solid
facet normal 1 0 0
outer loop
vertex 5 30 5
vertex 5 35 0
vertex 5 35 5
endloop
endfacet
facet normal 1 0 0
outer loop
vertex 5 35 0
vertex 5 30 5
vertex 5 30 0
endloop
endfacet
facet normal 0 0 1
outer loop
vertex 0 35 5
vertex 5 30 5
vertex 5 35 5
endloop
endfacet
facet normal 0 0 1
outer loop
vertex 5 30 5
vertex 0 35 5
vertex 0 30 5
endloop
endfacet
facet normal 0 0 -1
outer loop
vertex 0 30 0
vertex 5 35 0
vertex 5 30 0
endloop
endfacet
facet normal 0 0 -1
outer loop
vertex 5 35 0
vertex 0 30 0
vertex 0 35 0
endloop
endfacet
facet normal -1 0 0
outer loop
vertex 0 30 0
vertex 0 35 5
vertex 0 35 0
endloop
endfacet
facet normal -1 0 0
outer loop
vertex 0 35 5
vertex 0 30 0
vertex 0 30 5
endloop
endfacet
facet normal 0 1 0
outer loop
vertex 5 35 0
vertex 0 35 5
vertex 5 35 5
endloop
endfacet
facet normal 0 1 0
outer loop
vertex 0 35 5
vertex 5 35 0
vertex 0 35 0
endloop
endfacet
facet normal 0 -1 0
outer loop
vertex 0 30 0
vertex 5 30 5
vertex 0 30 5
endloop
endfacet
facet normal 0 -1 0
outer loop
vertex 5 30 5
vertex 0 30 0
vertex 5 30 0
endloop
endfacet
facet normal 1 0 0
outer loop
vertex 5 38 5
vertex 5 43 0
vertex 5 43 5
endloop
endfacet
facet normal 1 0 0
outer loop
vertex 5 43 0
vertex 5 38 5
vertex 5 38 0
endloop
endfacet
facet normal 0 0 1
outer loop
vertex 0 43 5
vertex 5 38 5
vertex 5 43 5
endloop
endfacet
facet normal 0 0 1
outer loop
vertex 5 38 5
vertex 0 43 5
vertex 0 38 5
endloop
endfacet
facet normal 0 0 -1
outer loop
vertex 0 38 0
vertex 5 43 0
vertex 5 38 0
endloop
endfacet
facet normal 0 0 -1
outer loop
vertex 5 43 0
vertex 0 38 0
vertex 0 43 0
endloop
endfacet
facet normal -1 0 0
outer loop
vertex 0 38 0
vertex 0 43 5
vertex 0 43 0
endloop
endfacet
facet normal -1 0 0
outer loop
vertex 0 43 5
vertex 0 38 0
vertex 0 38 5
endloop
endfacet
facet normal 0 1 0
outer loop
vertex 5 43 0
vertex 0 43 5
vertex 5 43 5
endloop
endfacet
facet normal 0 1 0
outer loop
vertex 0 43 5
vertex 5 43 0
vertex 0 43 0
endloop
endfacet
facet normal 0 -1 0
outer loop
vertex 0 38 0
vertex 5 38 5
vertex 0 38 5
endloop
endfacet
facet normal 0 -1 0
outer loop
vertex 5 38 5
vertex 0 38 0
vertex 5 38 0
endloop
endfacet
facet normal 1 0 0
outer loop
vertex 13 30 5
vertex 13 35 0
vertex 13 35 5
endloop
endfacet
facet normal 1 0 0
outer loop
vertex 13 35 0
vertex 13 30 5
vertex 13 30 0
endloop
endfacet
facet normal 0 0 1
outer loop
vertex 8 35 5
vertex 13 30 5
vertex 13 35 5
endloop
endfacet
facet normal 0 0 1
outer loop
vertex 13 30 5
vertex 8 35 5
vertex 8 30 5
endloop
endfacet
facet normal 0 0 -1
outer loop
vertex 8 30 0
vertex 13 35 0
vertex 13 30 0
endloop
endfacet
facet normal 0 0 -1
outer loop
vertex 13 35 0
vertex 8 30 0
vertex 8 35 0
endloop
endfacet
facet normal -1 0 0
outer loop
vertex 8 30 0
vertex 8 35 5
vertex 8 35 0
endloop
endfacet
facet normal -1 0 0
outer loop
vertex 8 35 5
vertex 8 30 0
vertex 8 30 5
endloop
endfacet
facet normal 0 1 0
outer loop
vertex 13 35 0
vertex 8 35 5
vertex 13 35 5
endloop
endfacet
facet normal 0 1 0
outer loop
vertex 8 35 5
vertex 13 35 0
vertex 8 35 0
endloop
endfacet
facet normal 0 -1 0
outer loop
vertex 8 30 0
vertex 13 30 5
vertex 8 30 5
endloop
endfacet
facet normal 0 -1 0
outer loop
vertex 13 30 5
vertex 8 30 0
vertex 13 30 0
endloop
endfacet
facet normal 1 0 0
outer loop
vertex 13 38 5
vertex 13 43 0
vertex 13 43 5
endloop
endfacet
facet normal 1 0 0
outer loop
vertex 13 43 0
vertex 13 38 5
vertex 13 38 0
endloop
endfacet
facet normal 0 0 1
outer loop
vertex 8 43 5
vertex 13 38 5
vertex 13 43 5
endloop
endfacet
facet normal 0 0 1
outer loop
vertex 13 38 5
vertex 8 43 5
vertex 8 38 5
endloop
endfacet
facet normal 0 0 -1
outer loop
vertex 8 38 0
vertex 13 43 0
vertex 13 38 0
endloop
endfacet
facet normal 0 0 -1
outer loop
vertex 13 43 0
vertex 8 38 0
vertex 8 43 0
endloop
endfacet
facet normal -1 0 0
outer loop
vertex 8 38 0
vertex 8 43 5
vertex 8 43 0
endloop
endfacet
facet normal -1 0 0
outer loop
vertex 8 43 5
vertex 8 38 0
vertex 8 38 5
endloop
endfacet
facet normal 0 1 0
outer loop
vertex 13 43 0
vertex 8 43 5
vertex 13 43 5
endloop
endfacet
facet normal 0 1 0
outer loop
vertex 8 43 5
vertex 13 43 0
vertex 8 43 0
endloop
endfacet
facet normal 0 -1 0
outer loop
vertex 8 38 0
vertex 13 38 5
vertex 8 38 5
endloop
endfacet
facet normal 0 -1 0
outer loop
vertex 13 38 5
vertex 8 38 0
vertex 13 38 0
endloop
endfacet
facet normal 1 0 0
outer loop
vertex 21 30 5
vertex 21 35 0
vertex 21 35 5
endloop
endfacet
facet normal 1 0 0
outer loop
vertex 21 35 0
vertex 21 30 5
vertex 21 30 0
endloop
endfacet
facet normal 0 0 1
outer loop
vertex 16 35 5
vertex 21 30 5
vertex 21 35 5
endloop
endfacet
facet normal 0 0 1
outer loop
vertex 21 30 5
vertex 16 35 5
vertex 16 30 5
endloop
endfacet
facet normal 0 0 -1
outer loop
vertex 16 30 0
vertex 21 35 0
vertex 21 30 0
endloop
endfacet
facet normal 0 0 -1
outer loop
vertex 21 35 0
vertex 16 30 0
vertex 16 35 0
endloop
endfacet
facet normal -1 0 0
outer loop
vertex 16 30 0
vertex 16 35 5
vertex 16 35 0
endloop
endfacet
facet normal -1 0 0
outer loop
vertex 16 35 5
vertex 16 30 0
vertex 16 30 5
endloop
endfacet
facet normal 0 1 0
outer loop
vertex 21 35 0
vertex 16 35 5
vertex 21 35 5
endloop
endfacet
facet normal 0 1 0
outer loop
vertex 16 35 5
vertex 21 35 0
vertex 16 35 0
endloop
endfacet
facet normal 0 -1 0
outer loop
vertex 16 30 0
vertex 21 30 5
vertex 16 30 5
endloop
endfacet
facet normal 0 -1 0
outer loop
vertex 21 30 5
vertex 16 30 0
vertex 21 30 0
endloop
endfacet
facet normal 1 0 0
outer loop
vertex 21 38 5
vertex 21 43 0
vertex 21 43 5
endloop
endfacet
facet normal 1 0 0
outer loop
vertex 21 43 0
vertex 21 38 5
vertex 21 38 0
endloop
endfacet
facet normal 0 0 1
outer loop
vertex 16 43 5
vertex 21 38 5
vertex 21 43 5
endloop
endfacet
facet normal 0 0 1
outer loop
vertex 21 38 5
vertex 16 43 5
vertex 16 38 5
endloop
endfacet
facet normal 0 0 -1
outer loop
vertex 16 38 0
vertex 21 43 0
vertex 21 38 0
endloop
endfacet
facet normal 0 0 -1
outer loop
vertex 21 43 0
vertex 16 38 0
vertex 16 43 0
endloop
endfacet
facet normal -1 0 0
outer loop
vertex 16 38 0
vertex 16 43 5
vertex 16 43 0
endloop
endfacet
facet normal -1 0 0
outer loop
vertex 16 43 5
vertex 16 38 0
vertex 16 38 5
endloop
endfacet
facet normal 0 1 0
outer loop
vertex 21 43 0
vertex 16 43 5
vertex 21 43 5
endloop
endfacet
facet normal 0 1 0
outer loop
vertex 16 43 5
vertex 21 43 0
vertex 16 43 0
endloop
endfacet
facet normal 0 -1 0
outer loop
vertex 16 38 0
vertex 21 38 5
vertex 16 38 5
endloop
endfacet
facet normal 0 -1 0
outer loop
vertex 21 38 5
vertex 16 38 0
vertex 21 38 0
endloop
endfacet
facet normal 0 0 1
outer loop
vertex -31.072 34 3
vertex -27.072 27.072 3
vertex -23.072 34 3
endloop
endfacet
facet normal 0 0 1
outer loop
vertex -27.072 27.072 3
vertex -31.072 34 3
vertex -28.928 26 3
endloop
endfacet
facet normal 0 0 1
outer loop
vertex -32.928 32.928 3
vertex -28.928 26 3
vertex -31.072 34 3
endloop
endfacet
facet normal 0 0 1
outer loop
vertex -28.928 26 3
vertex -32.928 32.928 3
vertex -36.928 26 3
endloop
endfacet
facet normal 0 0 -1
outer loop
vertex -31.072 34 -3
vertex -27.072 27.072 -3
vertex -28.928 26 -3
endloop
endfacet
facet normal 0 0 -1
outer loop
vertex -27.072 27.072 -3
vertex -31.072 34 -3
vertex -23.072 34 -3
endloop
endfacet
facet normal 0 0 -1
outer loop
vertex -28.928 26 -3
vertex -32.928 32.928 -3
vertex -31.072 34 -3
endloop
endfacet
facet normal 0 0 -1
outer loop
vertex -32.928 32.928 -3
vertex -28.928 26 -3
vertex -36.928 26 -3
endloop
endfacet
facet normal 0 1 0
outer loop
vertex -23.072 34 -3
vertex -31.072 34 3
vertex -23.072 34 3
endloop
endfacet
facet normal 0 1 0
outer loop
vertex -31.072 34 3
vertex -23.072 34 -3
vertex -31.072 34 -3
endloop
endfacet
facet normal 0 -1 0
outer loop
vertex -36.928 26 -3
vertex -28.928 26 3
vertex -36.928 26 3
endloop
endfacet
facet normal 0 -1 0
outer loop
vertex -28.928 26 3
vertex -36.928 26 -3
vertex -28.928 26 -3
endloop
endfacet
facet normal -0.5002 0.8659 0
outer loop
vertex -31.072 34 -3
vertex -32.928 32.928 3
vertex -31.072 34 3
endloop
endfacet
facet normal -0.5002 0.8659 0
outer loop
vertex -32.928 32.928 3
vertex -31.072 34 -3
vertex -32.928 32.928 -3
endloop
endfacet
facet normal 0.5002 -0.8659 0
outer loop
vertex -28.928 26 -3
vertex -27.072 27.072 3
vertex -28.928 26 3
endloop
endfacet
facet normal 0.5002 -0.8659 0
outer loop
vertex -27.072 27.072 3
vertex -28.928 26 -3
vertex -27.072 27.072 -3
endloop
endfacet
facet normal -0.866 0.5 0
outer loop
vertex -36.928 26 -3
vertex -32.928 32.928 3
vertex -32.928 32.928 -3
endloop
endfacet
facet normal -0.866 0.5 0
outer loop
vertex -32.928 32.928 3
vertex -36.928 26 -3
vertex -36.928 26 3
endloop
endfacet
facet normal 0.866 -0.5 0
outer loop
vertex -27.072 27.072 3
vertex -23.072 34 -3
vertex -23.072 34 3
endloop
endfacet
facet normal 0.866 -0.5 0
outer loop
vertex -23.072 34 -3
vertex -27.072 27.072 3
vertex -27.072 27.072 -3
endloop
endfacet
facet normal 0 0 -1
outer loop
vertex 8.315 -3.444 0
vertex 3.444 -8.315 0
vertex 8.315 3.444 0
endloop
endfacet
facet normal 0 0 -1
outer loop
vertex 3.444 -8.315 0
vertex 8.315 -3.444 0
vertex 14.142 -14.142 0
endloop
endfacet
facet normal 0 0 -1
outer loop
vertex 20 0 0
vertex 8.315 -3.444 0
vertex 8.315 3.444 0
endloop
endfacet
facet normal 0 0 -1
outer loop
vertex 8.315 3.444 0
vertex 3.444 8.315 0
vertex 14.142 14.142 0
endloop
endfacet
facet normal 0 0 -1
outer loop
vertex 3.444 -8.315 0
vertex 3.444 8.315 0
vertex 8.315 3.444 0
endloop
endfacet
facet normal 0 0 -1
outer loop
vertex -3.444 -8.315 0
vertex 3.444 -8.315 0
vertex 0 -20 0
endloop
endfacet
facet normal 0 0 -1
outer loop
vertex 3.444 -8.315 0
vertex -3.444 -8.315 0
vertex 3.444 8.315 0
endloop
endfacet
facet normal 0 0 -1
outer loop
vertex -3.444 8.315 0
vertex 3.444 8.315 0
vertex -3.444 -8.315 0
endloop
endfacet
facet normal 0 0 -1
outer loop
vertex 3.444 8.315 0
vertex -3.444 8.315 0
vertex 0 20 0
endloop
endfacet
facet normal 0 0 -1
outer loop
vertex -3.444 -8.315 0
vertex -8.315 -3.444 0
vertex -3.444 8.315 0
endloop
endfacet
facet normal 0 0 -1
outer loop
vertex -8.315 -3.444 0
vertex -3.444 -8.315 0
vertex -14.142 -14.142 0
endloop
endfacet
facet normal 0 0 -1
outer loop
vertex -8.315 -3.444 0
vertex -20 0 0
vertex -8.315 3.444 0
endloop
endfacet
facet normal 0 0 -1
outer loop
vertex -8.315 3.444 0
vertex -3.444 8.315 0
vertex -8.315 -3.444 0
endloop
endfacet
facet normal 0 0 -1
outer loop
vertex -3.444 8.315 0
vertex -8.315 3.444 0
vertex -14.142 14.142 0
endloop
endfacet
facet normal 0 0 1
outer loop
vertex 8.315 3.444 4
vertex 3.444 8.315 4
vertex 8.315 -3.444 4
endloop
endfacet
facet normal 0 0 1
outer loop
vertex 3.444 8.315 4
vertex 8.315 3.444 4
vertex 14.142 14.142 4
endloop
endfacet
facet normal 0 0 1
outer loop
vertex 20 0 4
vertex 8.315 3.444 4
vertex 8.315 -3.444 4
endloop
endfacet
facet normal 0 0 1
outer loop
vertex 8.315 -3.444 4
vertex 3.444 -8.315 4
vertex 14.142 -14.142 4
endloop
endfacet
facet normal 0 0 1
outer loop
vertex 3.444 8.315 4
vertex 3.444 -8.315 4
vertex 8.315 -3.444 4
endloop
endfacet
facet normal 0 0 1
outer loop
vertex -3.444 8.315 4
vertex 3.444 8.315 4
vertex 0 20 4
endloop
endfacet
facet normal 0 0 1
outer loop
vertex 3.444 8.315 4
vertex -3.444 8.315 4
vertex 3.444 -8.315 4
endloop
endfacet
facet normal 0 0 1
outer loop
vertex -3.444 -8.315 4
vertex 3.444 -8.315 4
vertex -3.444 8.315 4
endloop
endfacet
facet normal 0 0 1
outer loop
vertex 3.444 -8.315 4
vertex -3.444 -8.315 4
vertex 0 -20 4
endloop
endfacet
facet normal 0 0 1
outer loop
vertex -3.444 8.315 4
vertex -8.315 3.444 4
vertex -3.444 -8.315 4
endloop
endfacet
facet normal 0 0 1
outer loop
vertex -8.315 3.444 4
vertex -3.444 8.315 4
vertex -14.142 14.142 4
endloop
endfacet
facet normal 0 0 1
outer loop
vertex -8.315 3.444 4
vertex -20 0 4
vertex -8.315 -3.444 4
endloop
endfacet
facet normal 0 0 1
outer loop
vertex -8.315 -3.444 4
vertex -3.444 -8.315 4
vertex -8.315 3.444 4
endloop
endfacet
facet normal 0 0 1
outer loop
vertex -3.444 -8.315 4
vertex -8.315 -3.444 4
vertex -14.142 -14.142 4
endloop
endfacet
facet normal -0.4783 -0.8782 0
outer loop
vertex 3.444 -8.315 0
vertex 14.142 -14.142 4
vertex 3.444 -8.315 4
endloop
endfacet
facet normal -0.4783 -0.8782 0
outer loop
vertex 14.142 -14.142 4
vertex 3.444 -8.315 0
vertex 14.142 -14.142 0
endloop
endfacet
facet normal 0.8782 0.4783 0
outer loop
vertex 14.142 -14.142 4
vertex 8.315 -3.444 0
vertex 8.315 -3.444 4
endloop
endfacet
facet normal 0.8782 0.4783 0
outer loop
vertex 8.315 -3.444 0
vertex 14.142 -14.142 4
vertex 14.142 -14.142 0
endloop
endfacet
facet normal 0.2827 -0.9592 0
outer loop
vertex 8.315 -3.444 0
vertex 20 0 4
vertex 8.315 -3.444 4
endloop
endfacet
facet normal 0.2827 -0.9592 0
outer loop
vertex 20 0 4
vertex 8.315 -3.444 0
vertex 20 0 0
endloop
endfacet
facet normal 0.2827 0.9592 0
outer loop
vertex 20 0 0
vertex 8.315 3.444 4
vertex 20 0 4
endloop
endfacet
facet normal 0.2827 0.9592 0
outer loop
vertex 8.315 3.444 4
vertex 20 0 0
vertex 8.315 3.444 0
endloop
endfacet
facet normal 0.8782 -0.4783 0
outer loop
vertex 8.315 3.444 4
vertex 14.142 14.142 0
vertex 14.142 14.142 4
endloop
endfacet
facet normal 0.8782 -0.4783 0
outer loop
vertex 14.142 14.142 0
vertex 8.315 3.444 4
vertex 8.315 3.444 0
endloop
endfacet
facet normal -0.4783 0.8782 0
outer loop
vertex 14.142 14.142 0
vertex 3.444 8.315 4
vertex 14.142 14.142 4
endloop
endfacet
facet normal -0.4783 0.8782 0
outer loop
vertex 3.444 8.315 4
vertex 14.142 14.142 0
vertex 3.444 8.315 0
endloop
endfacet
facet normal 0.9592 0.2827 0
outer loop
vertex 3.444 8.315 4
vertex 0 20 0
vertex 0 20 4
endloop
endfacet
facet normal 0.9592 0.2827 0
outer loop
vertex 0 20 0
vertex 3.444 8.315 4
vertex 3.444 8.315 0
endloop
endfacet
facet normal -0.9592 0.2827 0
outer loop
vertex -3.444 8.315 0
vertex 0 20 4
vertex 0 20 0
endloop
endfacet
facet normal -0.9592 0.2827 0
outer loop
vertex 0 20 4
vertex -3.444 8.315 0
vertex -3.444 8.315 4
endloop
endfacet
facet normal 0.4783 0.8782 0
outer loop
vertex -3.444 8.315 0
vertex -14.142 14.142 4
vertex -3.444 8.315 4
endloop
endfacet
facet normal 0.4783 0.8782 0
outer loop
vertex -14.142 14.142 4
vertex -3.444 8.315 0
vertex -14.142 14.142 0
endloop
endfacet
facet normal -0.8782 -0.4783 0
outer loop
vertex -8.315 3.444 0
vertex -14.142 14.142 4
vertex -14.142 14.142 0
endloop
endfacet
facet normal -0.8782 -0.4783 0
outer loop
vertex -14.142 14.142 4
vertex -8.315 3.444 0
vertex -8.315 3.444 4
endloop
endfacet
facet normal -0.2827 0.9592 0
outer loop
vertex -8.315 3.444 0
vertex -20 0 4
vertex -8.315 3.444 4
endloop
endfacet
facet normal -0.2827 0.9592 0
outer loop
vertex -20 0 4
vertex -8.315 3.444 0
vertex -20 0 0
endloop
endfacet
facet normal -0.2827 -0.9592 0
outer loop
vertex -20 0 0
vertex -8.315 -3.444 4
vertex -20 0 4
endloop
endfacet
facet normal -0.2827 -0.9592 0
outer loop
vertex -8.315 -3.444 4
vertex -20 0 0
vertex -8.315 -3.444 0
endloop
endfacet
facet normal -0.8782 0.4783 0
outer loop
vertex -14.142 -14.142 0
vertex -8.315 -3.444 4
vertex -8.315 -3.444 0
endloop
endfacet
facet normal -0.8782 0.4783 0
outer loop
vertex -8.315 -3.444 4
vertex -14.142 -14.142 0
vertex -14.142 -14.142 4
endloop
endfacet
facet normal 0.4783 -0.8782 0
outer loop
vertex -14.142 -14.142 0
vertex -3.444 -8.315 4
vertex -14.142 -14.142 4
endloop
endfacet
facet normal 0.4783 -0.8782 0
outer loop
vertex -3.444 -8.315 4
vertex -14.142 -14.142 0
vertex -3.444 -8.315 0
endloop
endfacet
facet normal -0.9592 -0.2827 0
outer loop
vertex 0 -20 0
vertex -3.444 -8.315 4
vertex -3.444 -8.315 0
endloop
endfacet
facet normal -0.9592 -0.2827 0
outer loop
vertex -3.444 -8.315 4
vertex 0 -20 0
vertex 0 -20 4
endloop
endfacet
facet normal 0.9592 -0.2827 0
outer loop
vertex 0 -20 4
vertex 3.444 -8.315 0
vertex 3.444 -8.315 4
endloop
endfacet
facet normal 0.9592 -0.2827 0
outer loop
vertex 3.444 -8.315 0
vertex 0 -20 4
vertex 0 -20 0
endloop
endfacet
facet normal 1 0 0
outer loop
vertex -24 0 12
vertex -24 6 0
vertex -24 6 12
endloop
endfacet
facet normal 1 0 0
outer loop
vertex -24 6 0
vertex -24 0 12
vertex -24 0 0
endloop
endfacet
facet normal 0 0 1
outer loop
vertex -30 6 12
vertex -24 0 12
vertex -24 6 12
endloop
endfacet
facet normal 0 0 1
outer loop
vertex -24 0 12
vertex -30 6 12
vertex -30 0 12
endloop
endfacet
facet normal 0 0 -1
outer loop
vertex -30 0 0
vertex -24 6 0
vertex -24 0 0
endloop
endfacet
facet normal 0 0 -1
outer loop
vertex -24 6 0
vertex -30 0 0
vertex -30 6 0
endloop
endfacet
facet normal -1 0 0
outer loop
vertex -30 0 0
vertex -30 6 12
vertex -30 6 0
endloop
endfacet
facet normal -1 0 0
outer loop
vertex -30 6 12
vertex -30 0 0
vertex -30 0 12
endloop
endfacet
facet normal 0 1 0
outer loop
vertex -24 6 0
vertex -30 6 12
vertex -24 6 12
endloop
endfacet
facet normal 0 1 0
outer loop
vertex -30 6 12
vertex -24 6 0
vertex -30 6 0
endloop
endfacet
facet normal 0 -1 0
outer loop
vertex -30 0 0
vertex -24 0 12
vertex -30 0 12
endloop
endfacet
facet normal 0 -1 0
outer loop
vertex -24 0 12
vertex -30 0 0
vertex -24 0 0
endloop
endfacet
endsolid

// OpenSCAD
// list comprehensions feeding polygon(), multi-variable for, let, intersection_for
n = 8;
star = [for (i = [0 : 2 * n - 1]) let(a = i * 180 / n, r = (i % 2 == 0) ? 20 : 9) [r * cos(a), r * sin(a)]];
linear_extrude(4) polygon(star);
for (i = [0 : 2], j = [0 : 1]) translate([i * 8, 30 + j * 8, 0]) cube(5);
let (w = 6, h = w * 2) translate([-30, 0, 0]) cube([w, w, h]);
translate([-30, 30, 0]) intersection_for (k = [0 : 2]) rotate([0, 0, k * 30]) cube([20, 8, 6], center = true);
